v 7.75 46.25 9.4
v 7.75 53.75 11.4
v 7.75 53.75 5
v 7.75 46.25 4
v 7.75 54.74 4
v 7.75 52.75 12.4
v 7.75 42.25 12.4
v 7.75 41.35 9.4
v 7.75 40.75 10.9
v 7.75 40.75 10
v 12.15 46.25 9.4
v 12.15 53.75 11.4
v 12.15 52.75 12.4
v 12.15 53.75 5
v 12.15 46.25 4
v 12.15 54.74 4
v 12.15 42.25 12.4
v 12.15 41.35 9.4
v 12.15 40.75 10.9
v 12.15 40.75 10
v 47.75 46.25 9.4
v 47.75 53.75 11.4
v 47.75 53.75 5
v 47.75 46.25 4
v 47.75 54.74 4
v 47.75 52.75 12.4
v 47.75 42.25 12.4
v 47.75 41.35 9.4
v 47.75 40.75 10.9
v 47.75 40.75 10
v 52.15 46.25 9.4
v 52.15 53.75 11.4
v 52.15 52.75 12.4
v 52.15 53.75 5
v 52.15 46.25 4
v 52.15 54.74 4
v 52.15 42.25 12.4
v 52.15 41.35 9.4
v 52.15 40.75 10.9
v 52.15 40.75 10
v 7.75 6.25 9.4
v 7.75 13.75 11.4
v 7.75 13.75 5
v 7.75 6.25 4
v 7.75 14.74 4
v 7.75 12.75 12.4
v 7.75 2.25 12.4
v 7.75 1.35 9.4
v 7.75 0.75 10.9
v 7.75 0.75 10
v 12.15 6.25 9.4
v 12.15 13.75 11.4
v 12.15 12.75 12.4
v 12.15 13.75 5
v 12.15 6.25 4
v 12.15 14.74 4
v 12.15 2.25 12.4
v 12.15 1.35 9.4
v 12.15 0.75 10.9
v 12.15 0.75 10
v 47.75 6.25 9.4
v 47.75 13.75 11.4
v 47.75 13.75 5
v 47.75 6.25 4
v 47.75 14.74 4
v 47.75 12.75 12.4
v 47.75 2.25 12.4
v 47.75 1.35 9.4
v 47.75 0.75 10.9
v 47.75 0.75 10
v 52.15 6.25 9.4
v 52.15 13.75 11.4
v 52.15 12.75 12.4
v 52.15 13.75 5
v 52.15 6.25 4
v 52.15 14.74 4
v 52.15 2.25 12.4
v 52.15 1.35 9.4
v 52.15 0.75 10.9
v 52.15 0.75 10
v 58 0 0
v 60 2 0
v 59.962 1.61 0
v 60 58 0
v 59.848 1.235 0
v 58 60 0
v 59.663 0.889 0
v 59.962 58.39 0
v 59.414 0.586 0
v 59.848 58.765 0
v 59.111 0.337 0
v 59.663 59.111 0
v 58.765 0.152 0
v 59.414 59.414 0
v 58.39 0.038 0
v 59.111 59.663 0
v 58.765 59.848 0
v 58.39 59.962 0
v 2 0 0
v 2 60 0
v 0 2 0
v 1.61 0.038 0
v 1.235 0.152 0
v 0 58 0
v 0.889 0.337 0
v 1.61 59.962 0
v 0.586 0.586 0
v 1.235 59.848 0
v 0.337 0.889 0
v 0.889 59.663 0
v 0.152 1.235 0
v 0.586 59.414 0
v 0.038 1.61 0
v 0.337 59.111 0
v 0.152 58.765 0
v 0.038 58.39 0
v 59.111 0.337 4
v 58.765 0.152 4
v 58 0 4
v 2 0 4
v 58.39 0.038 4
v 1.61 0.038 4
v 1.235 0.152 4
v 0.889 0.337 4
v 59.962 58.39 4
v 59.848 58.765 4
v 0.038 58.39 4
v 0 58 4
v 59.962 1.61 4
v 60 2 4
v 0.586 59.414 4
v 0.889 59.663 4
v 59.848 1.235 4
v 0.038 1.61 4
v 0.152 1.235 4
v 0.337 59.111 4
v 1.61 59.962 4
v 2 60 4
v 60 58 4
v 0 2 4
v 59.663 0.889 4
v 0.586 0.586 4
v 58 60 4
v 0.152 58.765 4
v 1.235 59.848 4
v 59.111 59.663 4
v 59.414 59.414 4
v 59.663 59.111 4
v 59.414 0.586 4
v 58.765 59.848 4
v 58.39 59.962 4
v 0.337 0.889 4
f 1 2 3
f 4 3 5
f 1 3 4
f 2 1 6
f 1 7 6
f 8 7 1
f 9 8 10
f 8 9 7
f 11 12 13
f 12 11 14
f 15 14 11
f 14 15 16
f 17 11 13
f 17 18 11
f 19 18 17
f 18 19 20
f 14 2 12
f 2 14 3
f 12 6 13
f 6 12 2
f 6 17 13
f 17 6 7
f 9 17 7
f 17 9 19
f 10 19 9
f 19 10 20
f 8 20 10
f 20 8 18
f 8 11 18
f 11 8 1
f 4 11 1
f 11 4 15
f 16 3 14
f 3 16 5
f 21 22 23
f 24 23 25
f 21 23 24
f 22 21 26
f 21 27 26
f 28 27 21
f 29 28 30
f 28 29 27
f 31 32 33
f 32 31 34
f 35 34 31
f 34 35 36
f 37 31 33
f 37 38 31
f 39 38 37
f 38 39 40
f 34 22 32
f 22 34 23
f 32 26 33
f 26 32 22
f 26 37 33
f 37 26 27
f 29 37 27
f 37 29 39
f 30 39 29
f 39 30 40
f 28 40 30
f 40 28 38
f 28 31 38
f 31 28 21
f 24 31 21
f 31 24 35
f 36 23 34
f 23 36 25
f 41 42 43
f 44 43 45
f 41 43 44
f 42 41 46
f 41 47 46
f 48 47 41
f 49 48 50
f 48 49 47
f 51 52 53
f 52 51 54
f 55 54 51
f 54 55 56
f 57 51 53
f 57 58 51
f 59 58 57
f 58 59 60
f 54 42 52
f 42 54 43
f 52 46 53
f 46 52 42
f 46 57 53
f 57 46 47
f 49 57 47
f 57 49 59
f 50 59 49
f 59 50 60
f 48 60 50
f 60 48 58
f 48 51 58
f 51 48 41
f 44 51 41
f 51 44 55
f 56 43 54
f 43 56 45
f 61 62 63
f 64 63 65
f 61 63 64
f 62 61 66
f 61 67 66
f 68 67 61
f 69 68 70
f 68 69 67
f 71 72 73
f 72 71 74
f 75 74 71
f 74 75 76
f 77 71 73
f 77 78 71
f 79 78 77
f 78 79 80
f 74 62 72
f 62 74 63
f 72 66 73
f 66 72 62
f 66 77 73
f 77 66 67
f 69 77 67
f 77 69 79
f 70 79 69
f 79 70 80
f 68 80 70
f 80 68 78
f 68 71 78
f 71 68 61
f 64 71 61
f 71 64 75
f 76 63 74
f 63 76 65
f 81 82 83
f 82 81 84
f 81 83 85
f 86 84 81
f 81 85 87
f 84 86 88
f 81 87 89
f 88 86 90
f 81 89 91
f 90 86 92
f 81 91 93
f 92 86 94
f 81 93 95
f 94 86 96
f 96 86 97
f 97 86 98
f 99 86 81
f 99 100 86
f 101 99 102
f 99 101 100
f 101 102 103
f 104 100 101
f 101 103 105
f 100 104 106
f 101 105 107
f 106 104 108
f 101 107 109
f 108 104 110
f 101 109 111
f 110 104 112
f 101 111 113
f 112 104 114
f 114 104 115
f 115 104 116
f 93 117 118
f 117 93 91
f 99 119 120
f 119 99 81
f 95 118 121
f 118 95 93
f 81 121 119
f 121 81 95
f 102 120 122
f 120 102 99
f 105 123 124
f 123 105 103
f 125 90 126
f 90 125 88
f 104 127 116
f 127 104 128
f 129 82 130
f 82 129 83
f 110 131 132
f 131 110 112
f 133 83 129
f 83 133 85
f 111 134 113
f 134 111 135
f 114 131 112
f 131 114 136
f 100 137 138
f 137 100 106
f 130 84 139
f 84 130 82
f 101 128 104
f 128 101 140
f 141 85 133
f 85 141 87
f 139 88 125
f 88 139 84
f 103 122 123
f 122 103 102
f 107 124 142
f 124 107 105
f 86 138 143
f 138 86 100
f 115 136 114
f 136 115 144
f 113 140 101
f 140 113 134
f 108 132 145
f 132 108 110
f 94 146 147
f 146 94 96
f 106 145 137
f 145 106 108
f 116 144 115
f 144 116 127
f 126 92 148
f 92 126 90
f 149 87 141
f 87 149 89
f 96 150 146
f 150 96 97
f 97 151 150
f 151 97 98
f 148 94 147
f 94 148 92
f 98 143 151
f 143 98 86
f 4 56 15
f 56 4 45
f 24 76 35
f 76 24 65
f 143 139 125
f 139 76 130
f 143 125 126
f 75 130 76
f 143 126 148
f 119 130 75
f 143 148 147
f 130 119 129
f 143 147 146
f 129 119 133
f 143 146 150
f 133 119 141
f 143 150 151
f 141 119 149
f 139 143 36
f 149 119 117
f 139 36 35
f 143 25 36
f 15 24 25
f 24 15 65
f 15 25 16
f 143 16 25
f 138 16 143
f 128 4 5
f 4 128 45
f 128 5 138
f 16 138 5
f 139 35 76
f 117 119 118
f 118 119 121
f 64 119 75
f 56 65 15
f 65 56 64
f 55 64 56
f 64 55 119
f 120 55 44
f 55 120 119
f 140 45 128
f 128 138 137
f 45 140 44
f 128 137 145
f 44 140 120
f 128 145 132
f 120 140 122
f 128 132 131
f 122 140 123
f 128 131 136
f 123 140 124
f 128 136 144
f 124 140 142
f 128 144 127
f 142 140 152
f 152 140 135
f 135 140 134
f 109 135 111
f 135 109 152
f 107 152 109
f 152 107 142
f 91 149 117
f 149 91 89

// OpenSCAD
// Parametric flat IKEA SKÅDIS mount for double-sided tape.
//
// The front face (z = 0) is the flat tape surface; hooks project from the
// back. Hook count and placement are inferred from the face size: every
// SKÅDIS slot position in the top and bottom rows that fits behind the face
// gets a hook, with the pattern centered on the plate.
//
// Model is already in print orientation: tape face down on the bed.
// Mount by pushing all hooks straight into the slots, then sliding down.

/* [Mount Face] */
// Width of the flat tape face (mm)
face_width = 60; // [20:1:400]
// Height of the flat tape face (mm)
face_height = 60; // [20:1:400]
// Thickness of the face plate (mm)
face_depth = 4; // [2:0.5:15]

/* [Hidden] */
$fn = 32;

// SKÅDIS board: 5 x 15 mm slots on a staggered lattice. Slots in the same
// row are 40 mm apart; adjacent rows are 20 mm apart, offset 20 mm sideways.
slot_h = 15;
row_pitch = 20;
col_pitch = 40;
board_t = 5;

// Hook geometry. tab_h + lip_h must stay under slot_h so the hook passes
// straight through the slot before dropping into place.
tab_w = 4.4;            // across the 5 mm slot width
tab_h = 7.5;            // tab height resting on the slot's bottom edge
lip_h = 5.5;            // how far the lip hangs below the slot behind the board
lip_t = 3;              // lip thickness
gap = board_t + 0.4;    // space for the board between plate and lip
margin = 2;             // keep tabs this far inside the plate edges
corner_r = 2;

W = face_width;
H = face_height;
T = face_depth;

// --- Rows (vertical) --------------------------------------------------------
// yb = y of a tab's bottom face (= the slot's bottom edge when hung).
y_span = H - 2 * margin - tab_h;
n_rows = y_span < 0 ? 0 : floor(y_span / row_pitch) + 1;
row_dist = row_pitch * (n_rows - 1);              // top row to bottom row
yb_bottom = margin + (y_span - row_dist) / 2;
yb_top = yb_bottom + row_dist;
stagger = (n_rows - 1) % 2 == 1 ? row_pitch : 0;  // odd row count apart => offset

// --- Columns (horizontal) ---------------------------------------------------
x_lo = margin + tab_w / 2;
x_hi = W - margin - tab_w / 2;

function row_xs(phase) =
    let(start = phase - col_pitch * floor((phase - x_lo) / col_pitch))
    [for (x = [start : col_pitch : x_hi + 1e-6]) x];

function layout(p) =
    let(top = row_xs(p),
        bot = n_rows > 1 ? row_xs(p + stagger) : [],
        all = concat(top, bot),
        ctr = len(all) ? (min(all) + max(all)) / 2 : W / 2)
    [len(all) * 1000 - abs(ctr - W / 2), top, bot];

// Slide the lattice across one column pitch; keep the phase with the most
// hooks, breaking ties by how well the pattern is centered.
candidates = [for (p = [x_lo : 0.25 : x_lo + col_pitch - 0.01]) layout(p)];
best = [for (c = candidates) if (c[0] == max([for (d = candidates) d[0]])) c][0];
top_xs = best[1];
bot_xs = best[2];

assert(n_rows > 0 && len(top_xs) > 0,
       "Face is too small to fit a SKÅDIS hook; increase width/height.");
assert(tab_h + lip_h < slot_h, "Hook too tall to pass through a slot.");

echo(str("SKÅDIS hooks: ", len(top_xs) + len(bot_xs),
         " (top row ", len(top_xs), ", bottom row ", len(bot_xs), ")"));

// --- Geometry ---------------------------------------------------------------
module plate()
    linear_extrude(T)
        offset(r = corner_r) offset(delta = -corner_r)
            square([W, H]);

// Hook profile drawn in (y, z), extruded along x.
module hook(xc, yb) {
    z1 = T + gap;
    z2 = z1 + lip_t;
    translate([xc - tab_w / 2, 0, 0])
        multmatrix([[0, 0, 1, 0], [1, 0, 0, 0], [0, 1, 0, 0]])
            linear_extrude(tab_w)
                polygon([
                    [yb, T - 0.01],
                    [yb + tab_h + 1, T - 0.01],       // small root fillet
                    [yb + tab_h, T + 1],
                    [yb + tab_h, z2 - 1],
                    [yb + tab_h - 1, z2],
                    [yb - lip_h + 1.5, z2],           // lead-in chamfer
                    [yb - lip_h, z2 - 1.5],
                    [yb - lip_h, z1 + 0.6],
                    [yb - lip_h + 0.6, z1],
                    [yb, z1],
                ]);
}

plate();
for (x = top_xs) hook(x, yb_top);
if (n_rows > 1) for (x = bot_xs) hook(x, yb_bottom);
